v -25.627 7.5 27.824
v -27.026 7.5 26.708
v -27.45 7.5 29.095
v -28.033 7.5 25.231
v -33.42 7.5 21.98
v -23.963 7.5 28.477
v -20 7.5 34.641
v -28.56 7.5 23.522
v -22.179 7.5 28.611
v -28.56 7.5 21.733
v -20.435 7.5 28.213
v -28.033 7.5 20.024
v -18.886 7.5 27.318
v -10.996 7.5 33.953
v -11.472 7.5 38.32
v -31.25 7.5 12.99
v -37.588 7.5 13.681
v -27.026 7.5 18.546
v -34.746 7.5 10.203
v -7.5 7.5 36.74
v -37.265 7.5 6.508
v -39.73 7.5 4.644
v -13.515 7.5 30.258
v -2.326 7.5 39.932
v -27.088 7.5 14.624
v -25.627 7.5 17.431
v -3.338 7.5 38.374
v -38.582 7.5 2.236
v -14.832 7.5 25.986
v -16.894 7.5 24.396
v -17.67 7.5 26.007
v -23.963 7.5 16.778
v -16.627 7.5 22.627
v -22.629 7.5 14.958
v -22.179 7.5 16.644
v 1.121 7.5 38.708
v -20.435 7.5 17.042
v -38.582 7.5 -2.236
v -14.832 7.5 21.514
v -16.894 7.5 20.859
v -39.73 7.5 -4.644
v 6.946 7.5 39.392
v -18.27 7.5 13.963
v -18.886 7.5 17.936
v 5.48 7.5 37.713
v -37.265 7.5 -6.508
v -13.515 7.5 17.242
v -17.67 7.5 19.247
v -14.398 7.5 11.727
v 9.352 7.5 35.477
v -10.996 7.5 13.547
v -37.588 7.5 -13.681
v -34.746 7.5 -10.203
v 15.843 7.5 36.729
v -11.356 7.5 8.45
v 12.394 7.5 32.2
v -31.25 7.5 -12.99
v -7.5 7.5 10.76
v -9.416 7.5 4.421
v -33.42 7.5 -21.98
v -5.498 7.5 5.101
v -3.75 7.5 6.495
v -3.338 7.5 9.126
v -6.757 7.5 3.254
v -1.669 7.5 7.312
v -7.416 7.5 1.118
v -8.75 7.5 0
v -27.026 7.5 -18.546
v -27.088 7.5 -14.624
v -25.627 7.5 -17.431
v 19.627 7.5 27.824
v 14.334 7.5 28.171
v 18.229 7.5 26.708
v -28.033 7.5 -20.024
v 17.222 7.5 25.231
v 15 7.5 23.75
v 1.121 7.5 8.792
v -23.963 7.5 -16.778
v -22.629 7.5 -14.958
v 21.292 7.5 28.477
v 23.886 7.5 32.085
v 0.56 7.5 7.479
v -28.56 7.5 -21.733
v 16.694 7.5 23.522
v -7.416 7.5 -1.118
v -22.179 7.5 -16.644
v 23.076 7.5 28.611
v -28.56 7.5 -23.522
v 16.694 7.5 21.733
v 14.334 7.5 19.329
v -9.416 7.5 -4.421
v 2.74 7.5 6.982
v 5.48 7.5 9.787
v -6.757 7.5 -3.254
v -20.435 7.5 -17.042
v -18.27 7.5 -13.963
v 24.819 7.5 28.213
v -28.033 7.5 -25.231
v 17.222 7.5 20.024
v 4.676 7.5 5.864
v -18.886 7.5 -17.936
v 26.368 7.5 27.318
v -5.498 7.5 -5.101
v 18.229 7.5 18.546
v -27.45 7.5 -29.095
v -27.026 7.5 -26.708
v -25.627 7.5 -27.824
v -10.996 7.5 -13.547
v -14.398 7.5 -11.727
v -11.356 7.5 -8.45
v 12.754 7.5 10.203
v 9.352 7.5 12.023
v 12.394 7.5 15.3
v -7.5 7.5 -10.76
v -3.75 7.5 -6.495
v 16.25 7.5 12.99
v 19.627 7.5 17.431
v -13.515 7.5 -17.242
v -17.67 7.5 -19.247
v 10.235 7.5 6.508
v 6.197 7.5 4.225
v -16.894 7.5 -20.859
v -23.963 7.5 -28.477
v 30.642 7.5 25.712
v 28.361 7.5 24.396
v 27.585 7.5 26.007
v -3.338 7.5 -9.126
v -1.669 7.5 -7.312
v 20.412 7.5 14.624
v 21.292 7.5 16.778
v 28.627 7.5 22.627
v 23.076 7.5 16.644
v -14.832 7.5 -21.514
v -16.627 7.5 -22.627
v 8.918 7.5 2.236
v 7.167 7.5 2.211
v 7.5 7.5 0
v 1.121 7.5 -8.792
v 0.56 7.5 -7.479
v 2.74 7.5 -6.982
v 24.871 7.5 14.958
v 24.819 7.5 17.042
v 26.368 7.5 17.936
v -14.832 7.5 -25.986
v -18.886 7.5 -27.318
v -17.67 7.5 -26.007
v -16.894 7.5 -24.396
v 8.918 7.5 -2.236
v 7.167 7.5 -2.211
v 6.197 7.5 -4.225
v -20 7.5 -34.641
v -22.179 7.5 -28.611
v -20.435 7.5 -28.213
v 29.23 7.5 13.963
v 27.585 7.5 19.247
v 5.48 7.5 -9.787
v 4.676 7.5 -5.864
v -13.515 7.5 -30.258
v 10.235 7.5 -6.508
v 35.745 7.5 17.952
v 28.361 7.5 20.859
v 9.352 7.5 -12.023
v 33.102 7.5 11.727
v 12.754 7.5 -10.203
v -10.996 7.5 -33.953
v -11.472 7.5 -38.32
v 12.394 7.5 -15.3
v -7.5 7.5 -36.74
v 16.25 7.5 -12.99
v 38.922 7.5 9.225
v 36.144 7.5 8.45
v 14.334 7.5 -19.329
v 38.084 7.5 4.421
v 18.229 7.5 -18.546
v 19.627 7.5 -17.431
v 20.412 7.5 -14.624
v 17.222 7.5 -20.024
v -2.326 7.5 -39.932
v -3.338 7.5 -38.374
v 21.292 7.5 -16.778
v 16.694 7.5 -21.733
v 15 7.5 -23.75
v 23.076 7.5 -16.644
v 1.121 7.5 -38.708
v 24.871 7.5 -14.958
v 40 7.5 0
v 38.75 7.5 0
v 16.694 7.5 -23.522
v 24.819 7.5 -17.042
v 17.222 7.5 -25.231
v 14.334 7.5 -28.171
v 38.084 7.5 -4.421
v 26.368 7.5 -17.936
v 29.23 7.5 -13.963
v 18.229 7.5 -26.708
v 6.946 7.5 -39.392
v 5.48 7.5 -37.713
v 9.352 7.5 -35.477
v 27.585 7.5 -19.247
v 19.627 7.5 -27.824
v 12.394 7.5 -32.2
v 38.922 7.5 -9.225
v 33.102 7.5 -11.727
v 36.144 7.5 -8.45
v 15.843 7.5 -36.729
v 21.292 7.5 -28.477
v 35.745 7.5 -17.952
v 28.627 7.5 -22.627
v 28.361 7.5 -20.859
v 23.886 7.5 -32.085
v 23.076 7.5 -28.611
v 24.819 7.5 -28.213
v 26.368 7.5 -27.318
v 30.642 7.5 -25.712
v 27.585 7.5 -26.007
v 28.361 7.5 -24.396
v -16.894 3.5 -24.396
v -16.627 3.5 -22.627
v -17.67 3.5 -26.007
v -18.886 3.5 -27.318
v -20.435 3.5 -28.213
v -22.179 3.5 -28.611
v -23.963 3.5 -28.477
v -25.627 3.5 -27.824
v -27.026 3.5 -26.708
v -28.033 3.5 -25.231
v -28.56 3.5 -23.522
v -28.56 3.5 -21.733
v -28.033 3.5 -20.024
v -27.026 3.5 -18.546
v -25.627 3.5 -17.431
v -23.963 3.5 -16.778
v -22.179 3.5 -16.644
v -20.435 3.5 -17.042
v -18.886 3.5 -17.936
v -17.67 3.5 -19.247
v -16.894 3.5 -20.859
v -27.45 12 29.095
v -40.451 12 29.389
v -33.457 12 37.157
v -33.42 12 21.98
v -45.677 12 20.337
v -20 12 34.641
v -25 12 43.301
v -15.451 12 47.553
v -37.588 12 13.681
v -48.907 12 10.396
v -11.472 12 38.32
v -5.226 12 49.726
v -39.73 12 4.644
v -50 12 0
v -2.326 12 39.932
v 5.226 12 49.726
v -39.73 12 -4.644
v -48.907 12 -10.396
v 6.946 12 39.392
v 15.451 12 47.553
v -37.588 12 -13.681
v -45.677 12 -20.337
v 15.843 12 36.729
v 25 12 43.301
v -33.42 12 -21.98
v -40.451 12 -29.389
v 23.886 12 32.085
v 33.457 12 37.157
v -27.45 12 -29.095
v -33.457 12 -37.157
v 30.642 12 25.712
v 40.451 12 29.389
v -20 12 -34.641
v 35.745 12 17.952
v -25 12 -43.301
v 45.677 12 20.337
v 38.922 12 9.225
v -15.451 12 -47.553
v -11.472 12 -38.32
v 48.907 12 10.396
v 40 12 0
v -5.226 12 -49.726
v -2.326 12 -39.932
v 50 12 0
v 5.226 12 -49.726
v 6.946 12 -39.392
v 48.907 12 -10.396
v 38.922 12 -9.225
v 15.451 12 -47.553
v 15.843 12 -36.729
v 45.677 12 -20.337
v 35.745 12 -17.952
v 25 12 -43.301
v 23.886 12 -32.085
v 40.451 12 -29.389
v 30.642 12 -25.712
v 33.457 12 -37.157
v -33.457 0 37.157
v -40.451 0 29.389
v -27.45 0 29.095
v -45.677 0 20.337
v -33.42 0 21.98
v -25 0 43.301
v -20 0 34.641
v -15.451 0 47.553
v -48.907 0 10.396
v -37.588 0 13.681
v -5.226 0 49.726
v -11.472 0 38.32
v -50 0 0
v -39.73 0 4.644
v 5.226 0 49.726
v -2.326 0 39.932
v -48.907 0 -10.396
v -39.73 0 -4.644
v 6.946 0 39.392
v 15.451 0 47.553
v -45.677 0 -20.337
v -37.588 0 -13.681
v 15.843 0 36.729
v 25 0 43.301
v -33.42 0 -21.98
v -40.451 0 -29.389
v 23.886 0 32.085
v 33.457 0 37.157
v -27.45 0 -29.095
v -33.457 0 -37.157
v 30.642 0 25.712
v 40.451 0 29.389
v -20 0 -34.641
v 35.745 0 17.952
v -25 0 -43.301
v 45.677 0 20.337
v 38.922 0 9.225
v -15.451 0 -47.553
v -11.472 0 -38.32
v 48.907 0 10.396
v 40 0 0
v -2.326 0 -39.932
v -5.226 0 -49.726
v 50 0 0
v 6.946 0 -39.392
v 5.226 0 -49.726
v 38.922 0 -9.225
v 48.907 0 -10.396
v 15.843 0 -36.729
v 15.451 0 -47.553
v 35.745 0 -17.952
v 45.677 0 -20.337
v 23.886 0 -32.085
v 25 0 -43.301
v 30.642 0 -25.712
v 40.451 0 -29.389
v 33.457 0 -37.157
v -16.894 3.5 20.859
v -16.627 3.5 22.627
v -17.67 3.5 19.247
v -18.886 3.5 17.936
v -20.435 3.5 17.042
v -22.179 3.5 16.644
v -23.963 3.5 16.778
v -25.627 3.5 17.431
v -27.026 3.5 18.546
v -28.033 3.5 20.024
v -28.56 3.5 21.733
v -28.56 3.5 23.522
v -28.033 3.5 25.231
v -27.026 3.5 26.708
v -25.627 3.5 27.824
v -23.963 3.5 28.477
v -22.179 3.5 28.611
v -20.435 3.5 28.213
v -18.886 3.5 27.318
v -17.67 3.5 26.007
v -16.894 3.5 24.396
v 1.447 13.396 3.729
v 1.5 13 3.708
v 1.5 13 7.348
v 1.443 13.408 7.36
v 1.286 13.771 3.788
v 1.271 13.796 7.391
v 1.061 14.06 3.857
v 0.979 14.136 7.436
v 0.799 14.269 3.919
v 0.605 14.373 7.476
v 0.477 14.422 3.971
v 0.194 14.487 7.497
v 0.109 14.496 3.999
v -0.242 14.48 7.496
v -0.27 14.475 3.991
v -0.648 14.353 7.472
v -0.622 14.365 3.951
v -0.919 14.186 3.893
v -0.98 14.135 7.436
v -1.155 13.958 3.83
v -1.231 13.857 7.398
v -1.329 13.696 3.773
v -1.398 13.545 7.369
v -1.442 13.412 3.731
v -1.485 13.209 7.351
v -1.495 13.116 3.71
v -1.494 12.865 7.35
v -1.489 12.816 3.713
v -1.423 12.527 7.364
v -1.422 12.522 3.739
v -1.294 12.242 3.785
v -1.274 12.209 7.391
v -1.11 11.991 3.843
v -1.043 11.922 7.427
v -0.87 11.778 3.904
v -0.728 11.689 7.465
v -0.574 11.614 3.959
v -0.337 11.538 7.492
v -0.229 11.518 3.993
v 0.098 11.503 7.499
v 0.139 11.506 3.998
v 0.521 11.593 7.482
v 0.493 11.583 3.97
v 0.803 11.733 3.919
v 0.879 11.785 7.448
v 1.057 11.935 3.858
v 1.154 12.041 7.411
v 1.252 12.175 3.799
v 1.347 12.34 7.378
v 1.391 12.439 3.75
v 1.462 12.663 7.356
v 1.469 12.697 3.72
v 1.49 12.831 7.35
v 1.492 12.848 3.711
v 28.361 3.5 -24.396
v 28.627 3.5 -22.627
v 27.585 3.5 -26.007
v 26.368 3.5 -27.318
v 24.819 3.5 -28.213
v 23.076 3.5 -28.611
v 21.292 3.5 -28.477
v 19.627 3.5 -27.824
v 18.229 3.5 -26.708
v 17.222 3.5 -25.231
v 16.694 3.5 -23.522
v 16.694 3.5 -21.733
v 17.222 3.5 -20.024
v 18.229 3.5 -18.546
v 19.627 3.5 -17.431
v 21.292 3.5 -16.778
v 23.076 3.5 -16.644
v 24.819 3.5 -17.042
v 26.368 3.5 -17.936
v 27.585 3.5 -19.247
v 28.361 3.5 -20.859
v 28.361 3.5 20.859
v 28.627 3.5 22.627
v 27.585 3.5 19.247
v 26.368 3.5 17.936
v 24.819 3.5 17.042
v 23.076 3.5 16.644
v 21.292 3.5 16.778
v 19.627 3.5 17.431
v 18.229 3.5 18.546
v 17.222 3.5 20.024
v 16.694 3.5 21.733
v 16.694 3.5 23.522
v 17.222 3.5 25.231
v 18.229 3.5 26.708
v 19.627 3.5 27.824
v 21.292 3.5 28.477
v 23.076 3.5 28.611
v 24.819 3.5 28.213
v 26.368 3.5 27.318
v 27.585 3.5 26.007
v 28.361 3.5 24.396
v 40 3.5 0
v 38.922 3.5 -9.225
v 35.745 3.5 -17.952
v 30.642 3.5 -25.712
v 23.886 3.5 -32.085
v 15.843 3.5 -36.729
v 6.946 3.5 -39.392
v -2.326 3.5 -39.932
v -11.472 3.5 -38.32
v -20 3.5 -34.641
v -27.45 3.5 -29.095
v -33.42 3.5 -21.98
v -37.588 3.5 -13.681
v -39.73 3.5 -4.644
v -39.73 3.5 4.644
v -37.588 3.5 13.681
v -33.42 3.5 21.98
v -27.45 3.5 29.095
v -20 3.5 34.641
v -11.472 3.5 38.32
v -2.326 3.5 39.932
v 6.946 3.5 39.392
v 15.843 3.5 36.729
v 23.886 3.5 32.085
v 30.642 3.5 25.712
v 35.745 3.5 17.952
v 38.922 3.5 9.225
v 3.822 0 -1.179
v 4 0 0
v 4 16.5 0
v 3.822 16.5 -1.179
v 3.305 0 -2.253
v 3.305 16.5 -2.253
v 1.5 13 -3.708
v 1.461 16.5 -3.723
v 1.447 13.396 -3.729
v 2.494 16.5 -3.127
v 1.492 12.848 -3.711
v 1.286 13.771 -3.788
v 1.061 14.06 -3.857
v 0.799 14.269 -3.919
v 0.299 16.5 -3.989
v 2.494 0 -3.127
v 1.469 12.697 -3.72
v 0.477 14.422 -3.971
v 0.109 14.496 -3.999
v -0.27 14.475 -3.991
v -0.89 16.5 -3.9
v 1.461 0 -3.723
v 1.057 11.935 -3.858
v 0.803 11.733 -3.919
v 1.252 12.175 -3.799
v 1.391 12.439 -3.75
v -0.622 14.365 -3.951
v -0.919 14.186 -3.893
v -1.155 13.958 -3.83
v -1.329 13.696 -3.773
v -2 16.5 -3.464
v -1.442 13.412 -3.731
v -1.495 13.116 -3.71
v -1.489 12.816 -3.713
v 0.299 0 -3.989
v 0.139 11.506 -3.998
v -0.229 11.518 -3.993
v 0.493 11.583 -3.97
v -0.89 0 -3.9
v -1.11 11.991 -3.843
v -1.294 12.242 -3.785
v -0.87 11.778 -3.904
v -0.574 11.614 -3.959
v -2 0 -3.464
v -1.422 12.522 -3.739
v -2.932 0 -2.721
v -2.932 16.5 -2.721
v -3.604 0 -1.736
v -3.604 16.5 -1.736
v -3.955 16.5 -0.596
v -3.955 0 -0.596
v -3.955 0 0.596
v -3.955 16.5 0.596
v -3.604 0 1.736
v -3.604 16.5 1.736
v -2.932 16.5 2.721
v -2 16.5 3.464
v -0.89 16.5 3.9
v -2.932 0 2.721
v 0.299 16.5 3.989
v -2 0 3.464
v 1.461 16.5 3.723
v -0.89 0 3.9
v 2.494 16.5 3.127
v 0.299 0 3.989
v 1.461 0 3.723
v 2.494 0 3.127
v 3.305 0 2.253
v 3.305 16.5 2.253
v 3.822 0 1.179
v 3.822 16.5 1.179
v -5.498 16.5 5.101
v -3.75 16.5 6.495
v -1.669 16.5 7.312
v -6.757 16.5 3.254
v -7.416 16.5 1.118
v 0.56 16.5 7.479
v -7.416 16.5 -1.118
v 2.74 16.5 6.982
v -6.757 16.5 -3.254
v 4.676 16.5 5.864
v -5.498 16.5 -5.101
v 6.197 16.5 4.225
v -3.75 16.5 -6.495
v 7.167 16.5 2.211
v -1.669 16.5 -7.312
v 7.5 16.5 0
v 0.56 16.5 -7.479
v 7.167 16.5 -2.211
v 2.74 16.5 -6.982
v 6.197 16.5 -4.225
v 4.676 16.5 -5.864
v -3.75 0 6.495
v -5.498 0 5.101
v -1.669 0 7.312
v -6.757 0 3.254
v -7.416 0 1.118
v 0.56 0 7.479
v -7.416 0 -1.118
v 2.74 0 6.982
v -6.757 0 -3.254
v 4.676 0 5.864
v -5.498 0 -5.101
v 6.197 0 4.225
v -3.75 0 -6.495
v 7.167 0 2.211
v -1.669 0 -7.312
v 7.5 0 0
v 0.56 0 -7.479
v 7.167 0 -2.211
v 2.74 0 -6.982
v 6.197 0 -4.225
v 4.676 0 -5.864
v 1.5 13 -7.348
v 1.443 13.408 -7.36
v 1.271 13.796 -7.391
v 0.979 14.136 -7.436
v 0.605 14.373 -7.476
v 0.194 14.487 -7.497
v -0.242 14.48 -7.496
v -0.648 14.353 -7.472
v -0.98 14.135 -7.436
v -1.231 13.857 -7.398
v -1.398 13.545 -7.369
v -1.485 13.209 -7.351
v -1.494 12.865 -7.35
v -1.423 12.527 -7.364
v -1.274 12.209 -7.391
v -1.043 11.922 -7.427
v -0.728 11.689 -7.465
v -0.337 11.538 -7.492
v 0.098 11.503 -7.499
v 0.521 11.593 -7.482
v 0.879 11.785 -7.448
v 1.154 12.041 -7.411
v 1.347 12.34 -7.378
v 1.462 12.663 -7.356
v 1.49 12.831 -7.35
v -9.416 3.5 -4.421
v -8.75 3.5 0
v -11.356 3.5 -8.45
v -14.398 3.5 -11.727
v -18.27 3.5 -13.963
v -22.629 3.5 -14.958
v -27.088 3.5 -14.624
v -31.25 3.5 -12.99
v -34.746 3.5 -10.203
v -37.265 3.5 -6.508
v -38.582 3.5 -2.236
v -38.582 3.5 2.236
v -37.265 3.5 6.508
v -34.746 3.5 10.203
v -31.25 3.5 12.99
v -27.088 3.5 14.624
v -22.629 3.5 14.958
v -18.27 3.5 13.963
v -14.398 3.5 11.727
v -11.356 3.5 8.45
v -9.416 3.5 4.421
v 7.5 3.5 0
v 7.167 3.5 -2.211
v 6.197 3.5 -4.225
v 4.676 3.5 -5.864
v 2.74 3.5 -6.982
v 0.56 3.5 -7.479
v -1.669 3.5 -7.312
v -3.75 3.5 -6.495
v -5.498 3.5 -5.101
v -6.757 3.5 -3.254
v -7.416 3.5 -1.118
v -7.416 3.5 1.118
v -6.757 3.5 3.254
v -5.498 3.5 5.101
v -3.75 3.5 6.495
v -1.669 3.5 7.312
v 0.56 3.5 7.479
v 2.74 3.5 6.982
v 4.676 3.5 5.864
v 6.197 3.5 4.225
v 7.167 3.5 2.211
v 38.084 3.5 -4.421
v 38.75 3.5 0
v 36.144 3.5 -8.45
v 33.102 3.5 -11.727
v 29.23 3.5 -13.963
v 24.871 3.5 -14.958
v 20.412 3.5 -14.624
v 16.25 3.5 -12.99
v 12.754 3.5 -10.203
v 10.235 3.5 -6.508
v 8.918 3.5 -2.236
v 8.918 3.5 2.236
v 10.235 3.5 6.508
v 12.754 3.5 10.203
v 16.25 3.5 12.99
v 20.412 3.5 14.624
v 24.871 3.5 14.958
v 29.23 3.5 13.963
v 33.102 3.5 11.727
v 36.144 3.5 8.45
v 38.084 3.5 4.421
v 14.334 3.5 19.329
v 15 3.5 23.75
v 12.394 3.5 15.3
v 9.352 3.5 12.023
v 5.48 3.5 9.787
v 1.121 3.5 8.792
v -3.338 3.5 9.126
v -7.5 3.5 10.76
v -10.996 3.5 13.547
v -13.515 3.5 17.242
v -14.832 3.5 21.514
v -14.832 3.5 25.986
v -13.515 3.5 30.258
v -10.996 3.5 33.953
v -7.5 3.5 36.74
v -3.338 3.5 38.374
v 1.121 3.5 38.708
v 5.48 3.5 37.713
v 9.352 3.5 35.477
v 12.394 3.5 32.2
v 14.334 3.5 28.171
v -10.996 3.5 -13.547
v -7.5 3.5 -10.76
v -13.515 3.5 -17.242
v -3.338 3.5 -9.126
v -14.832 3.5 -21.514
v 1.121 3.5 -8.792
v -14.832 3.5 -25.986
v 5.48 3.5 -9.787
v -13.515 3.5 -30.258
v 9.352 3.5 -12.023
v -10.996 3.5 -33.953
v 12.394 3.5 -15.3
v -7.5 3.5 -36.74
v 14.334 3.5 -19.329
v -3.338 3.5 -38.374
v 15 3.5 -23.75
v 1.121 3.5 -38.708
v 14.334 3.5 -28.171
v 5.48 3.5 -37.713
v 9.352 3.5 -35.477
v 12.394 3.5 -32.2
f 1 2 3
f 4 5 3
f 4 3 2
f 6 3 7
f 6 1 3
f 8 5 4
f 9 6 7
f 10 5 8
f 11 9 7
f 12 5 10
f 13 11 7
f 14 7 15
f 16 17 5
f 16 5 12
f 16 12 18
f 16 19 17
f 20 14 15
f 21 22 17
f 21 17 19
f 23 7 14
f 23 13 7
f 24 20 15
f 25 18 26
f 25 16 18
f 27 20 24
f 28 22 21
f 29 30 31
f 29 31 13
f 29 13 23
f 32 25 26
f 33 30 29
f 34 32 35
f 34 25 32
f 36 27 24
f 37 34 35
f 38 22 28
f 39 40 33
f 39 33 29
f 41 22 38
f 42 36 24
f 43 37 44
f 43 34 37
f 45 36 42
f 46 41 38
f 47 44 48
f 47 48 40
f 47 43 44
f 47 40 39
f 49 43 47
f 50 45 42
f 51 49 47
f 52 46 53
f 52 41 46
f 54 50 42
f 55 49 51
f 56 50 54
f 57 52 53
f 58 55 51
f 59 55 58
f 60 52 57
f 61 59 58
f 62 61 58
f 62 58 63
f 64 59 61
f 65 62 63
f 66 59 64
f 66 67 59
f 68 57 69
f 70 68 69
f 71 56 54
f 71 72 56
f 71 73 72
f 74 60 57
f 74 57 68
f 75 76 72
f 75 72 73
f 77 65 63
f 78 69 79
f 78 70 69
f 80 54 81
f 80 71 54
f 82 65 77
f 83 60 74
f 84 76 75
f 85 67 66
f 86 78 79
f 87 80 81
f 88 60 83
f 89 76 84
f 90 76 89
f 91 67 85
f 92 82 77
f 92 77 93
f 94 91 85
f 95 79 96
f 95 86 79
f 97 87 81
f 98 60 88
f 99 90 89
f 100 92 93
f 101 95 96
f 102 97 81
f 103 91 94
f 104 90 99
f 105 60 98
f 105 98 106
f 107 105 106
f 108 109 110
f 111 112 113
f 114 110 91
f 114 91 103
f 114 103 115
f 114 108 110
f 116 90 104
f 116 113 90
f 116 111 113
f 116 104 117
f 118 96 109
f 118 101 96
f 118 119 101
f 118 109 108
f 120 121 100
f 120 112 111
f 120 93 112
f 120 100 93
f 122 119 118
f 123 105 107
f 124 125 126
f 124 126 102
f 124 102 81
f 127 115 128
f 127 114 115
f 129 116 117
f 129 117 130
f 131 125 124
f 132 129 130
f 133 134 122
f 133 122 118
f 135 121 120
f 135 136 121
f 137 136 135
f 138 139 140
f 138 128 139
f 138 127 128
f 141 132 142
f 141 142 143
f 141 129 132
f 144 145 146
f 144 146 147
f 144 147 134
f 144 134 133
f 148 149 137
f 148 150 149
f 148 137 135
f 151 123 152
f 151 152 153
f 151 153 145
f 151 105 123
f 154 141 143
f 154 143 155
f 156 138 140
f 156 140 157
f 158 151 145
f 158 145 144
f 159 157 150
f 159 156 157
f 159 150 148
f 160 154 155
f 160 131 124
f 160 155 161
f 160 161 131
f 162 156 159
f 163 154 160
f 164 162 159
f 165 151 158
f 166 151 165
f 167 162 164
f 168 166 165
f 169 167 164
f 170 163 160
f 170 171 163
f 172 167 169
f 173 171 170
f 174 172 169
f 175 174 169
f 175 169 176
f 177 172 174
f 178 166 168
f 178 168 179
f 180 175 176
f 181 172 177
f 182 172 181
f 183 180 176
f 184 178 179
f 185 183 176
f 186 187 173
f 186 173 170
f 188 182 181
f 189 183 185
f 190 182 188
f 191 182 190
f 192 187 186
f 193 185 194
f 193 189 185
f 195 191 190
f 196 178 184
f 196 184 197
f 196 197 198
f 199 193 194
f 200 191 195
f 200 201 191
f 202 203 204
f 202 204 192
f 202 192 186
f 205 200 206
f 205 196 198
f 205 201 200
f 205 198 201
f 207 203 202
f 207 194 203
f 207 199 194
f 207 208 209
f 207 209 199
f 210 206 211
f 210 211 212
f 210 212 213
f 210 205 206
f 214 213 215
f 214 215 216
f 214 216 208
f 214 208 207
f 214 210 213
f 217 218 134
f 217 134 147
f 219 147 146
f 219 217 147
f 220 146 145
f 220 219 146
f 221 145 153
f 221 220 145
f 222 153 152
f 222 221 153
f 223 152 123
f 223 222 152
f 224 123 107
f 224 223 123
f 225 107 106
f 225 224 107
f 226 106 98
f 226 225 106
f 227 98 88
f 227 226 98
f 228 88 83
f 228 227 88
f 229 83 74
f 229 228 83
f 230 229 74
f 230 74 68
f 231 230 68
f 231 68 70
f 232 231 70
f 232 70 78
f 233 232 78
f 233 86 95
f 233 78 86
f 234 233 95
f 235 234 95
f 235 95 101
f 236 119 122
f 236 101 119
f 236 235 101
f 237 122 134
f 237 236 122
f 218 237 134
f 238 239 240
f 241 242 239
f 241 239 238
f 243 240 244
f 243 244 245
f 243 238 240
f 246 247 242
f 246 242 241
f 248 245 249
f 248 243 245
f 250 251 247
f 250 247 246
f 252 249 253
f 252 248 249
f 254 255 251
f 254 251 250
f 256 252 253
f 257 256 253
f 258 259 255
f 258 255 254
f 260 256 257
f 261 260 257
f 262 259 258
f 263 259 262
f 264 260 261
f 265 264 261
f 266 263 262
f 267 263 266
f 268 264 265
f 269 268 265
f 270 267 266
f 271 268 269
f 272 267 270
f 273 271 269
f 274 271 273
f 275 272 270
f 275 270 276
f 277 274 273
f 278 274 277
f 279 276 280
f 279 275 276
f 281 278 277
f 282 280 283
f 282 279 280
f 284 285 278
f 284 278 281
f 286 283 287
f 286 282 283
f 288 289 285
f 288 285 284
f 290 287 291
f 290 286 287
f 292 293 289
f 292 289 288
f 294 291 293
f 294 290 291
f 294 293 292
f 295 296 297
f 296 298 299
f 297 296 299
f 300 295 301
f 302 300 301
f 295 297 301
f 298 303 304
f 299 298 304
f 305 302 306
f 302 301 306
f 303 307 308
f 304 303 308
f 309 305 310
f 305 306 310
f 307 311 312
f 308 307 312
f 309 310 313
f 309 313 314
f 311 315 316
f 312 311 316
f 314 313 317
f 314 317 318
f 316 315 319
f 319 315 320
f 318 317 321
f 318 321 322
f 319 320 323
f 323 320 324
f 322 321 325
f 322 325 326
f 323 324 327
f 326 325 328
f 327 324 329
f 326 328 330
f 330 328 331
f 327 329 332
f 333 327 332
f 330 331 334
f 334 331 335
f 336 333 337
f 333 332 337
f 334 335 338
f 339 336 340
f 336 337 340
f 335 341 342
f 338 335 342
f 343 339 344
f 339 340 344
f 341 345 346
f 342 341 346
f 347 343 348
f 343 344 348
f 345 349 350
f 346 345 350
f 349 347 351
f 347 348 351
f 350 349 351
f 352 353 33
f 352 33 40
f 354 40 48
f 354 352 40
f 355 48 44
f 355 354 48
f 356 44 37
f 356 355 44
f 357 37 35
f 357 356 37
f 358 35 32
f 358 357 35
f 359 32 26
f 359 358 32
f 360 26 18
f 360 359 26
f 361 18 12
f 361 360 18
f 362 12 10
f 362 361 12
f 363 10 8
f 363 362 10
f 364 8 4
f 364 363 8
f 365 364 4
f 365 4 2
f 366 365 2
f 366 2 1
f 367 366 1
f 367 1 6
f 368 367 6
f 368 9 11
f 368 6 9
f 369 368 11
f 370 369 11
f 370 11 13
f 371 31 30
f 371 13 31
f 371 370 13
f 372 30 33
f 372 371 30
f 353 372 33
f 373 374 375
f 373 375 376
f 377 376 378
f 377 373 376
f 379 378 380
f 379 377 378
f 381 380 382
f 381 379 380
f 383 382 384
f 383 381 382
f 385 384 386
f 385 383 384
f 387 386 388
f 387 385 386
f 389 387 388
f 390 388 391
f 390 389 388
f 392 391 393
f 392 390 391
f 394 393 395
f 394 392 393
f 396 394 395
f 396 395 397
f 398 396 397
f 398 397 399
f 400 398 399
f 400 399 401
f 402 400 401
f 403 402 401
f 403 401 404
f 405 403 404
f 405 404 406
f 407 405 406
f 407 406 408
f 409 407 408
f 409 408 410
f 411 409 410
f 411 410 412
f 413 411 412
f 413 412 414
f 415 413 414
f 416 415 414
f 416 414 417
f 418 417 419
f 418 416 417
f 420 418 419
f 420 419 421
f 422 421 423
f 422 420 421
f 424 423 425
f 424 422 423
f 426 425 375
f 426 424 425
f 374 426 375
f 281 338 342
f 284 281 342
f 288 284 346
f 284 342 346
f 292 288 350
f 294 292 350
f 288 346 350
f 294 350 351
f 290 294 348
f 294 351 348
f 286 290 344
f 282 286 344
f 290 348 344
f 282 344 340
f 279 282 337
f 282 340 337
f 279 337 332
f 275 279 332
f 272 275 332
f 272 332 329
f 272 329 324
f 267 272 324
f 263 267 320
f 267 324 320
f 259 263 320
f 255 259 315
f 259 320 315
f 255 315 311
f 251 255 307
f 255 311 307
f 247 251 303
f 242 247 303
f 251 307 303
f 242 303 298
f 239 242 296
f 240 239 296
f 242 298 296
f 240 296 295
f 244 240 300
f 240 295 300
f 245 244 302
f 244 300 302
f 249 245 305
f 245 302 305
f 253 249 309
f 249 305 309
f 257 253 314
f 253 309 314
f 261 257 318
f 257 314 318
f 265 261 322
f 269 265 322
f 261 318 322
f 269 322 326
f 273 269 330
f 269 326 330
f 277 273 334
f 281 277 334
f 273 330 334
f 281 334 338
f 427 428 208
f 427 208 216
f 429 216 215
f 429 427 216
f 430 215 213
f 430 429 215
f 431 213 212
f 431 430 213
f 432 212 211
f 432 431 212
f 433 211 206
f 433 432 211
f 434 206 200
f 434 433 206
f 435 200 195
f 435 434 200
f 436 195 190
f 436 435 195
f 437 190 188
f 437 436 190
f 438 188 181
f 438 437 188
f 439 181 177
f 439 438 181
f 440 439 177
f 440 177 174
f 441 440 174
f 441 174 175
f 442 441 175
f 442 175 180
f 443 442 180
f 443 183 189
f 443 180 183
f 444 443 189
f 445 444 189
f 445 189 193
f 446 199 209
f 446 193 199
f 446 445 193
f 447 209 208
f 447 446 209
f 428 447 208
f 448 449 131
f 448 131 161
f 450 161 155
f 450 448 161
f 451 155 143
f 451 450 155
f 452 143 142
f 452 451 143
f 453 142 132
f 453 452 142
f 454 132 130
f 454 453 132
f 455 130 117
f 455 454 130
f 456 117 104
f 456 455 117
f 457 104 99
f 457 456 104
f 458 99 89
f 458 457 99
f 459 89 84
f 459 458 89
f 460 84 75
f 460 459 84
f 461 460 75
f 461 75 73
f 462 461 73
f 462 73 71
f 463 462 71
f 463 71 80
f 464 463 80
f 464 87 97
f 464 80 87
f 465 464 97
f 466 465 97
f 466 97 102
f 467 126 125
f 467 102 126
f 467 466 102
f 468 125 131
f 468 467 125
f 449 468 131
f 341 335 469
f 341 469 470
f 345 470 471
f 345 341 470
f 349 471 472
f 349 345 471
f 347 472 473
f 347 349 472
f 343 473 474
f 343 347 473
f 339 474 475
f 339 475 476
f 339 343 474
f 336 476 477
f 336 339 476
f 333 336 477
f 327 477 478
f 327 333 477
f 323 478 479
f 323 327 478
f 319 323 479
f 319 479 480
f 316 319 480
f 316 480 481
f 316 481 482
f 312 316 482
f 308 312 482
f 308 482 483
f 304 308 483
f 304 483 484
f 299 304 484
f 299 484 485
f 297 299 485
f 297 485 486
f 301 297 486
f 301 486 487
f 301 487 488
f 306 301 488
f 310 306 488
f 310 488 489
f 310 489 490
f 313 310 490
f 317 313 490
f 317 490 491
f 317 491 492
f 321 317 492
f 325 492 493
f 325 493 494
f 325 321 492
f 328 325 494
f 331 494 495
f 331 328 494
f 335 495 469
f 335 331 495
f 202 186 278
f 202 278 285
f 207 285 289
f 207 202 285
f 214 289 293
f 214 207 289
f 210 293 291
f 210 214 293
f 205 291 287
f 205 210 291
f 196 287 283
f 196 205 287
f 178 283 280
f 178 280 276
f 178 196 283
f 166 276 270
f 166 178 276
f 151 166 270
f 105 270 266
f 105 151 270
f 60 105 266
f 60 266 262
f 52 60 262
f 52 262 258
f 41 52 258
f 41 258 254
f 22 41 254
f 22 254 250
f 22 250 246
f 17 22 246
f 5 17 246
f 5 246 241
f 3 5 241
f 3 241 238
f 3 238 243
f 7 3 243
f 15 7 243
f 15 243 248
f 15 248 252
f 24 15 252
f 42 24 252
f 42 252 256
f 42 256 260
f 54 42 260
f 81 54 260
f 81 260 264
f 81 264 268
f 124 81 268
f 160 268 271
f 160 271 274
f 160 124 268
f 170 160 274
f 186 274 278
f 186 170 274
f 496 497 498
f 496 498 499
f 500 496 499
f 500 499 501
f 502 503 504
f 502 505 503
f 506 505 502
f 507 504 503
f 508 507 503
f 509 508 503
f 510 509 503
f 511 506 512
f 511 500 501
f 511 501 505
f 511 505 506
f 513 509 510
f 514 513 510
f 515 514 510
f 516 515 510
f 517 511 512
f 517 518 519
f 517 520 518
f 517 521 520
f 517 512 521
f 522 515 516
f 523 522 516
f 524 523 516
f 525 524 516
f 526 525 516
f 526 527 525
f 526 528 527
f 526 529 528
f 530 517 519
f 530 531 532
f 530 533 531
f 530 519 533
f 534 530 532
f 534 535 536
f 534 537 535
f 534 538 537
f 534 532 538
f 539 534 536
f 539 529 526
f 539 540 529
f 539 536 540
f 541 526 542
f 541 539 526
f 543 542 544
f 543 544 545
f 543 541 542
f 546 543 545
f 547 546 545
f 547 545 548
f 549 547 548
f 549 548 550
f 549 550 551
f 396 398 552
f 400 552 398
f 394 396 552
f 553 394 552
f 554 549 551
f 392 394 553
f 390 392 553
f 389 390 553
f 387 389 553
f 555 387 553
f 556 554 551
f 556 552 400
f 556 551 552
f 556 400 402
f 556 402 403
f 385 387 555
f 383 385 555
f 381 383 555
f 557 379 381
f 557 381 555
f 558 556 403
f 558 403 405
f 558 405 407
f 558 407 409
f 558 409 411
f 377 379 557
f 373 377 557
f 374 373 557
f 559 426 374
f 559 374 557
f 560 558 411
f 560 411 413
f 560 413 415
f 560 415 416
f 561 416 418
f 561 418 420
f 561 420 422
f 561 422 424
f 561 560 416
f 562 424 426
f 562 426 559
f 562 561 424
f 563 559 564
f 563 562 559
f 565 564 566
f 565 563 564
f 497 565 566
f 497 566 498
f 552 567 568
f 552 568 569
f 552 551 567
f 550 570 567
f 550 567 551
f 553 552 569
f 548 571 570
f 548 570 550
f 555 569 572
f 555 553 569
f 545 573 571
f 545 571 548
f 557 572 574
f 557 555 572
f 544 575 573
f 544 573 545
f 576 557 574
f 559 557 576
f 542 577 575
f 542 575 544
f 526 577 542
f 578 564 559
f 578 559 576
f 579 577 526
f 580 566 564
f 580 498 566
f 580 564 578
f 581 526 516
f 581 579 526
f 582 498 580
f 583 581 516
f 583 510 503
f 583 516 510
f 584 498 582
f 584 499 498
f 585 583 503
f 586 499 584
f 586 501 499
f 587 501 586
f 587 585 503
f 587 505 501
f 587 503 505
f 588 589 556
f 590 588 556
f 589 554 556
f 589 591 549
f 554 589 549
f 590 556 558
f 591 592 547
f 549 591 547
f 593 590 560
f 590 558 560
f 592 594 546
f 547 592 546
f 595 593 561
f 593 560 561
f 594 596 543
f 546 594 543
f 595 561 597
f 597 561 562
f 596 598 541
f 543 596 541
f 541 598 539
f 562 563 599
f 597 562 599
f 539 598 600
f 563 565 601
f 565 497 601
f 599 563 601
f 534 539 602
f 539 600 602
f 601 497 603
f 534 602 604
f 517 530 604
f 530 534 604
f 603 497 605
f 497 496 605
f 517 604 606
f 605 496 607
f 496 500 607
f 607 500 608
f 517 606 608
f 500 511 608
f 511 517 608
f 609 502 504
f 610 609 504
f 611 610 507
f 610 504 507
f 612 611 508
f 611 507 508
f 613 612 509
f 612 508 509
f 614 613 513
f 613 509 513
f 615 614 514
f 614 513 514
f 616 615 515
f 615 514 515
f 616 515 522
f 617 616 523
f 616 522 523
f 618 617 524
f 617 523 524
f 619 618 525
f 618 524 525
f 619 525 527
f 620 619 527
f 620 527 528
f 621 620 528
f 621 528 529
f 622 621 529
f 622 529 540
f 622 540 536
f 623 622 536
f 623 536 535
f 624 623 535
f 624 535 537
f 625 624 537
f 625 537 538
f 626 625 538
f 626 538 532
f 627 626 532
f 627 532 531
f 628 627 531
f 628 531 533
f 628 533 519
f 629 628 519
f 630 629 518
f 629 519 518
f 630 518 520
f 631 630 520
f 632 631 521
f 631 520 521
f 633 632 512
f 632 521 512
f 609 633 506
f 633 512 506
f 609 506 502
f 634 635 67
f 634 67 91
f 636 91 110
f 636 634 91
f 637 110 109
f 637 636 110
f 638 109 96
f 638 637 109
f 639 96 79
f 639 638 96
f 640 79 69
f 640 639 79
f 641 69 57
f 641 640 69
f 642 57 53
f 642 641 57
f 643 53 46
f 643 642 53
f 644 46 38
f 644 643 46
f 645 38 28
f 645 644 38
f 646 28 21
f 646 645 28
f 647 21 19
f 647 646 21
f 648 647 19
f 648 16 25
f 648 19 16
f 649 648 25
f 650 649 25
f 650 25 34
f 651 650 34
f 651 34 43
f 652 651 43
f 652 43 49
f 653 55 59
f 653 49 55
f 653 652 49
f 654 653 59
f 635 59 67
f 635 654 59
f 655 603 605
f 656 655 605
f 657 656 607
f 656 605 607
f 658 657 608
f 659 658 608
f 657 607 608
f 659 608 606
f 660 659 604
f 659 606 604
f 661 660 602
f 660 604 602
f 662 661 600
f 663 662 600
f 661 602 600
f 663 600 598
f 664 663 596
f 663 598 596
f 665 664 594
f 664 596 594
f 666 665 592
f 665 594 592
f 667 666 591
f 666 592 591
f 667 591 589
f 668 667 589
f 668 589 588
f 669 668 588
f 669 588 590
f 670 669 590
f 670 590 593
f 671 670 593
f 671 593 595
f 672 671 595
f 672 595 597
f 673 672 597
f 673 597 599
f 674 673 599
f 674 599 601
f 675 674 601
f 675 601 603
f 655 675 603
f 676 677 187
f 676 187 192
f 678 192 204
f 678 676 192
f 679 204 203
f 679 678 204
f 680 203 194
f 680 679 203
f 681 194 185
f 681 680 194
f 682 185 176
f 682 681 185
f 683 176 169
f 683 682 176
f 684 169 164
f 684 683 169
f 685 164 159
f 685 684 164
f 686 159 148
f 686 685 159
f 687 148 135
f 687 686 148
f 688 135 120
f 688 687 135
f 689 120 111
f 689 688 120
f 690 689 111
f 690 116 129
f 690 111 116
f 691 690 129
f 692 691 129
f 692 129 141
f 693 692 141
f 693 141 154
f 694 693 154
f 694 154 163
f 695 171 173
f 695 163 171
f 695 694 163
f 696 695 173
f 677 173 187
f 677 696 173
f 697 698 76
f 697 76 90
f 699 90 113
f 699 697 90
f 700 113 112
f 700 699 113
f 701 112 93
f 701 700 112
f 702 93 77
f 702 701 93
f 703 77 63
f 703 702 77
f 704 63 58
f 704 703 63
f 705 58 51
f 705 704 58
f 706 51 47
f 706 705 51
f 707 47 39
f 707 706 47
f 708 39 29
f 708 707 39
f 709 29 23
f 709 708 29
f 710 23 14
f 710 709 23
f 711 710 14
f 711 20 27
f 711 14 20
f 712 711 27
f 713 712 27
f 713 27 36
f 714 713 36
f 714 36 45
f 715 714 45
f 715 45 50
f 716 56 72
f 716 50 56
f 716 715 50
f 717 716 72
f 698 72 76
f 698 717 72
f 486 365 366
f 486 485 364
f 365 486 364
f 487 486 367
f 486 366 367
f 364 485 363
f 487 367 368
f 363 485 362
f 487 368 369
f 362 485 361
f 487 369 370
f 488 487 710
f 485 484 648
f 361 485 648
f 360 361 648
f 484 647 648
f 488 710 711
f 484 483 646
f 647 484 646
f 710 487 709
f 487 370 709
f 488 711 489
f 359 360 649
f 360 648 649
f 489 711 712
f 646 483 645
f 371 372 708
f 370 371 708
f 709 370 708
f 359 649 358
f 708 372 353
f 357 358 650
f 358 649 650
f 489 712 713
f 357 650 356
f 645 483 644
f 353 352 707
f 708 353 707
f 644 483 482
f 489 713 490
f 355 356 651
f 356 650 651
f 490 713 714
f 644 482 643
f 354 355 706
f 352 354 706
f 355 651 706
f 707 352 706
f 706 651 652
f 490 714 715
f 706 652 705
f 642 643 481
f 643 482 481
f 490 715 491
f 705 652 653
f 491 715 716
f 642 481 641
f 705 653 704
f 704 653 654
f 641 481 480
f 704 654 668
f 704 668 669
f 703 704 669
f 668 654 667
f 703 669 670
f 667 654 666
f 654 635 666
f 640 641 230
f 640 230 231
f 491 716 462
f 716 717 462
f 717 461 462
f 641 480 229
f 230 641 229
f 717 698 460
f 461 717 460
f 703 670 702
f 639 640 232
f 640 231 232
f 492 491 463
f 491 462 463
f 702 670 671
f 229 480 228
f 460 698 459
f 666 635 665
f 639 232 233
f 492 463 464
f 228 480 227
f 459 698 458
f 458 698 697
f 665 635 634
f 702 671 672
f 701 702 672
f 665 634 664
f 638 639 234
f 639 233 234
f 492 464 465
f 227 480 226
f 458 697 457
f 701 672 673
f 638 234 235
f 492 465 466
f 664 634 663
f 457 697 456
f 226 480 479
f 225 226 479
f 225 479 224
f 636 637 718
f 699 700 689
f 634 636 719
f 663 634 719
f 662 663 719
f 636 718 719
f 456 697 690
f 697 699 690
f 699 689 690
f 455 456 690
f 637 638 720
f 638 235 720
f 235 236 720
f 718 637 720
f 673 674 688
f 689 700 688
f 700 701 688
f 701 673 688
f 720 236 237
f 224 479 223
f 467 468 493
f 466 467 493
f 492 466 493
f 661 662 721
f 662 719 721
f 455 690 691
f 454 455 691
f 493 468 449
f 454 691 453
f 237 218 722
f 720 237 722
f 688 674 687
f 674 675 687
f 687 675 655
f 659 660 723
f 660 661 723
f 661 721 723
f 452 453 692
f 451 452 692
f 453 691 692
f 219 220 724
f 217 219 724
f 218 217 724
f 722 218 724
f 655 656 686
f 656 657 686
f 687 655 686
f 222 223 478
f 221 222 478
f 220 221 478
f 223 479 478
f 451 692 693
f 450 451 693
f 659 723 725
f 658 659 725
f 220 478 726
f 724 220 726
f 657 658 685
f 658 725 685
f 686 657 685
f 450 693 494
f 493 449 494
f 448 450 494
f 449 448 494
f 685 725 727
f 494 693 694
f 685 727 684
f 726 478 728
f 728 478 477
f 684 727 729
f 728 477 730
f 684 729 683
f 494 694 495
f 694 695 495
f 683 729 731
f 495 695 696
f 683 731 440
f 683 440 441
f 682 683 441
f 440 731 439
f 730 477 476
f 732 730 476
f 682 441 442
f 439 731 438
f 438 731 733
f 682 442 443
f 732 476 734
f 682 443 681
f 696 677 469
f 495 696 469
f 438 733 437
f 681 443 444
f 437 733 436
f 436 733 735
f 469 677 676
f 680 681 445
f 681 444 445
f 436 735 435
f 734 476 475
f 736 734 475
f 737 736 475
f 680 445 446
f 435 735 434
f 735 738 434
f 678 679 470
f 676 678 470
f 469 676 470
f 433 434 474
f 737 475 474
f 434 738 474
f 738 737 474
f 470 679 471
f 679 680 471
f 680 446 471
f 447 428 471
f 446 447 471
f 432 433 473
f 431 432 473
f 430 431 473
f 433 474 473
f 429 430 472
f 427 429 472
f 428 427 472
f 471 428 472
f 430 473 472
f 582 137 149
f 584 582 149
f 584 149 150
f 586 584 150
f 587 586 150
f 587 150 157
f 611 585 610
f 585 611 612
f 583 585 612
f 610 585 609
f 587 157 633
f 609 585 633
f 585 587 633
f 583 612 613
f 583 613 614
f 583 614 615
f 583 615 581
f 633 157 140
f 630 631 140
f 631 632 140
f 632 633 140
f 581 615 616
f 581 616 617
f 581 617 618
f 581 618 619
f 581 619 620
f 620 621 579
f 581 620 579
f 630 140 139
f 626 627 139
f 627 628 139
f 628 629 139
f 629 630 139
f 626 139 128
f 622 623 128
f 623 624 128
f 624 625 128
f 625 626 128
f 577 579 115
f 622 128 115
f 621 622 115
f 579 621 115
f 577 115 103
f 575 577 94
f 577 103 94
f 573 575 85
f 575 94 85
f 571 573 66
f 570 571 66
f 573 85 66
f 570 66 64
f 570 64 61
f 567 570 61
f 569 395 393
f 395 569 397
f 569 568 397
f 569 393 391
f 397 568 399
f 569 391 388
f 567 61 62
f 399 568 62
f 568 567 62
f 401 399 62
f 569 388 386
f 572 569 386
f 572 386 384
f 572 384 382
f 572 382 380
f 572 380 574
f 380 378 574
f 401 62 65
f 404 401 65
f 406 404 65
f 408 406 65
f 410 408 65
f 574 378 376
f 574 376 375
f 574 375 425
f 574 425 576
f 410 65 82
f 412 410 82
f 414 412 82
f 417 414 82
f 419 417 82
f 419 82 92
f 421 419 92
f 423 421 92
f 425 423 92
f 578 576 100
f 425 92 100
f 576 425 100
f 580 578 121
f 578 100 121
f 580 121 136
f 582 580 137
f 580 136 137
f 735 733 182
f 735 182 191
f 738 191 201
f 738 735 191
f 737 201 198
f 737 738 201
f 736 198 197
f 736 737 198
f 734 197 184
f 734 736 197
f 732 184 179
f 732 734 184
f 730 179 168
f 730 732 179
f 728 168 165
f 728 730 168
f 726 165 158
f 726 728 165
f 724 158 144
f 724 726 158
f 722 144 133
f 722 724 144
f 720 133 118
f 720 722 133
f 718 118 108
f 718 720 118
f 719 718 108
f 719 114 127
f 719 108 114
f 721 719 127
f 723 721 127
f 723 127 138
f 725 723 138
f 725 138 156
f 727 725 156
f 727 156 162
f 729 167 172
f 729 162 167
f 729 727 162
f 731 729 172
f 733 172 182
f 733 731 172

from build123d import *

# Parameters (mm, degrees)
SKETCH1_R               = 50
SKETCH1_R_2             = 40
BOSS_EXTRUDE1_DEPTH     = 12
SKETCH1_4_R             = 7.5
SKETCH1_4_R_2           = 4
BOSS_EXTRUDE2_DEPTH     = 16.5
BOSS_EXTRUDE3_START     = 3.5
SKETCH1_5_R             = 40
SKETCH1_5_R_2           = 7.5
BOSS_EXTRUDE3_DEPTH     = 4
SKETCH2_R               = 15
SKETCH2_R_2             = 6
CUT_EXTRUDE3_DEPTH      = 17.5
CUT_EXTRUDE3_DEPTH_BACK = 1
SKETCH3_R               = 1.5
CUT_EXTRUDE4_DEPTH      = 10
CUT_EXTRUDE4_DEPTH_BACK = 10


with BuildPart() as part:
    # Sketch1 → Boss-Extrude1 (new body)
    with BuildSketch(Plane(origin=(0, 0, 0), x_dir=(1, 0, 0), z_dir=(0, 1, 0))):
        Circle(SKETCH1_R)
        Circle(SKETCH1_R_2, mode=Mode.SUBTRACT)
    extrude(amount=BOSS_EXTRUDE1_DEPTH)



with BuildPart() as body_2:
    # Sketch1<4> → Boss-Extrude2 (new body)
    with BuildSketch(Plane(origin=(0, 0, 0), x_dir=(1, 0, 0), z_dir=(0, 1, 0))):
        Circle(SKETCH1_4_R)
        Circle(SKETCH1_4_R_2, mode=Mode.SUBTRACT)
    extrude(amount=BOSS_EXTRUDE2_DEPTH)


with BuildPart() as part_1:
    add(part.part)

    add(body_2.part)  # Boss-Extrude3 merges body 2
    # Sketch1<5> → Boss-Extrude3 (add)
    with BuildSketch(Plane(origin=(0, 0, 0), x_dir=(1, 0, 0), z_dir=(0, 1, 0)).offset(BOSS_EXTRUDE3_START)):
        Circle(SKETCH1_5_R)
        Circle(SKETCH1_5_R_2, mode=Mode.SUBTRACT)
    extrude(amount=BOSS_EXTRUDE3_DEPTH)

    # Sketch2 → Cut-Extrude3 (cut, two sides)
    with BuildSketch(Plane(origin=(0, 0, 0), x_dir=(1, 0, 0), z_dir=(0, 1, 0))) as cut_extrude3_sk:
        with Locations((-23.75, 0)):
            Circle(SKETCH2_R)
        with Locations((0, -23.75)):
            Circle(SKETCH2_R)
        with Locations((-22.627416998, -22.627416998)):
            Circle(SKETCH2_R_2)
        with Locations((-22.627416998, 22.627416998)):
            Circle(SKETCH2_R_2)
        with Locations((0, 23.75)):
            Circle(SKETCH2_R)
        with Locations((23.75, 0)):
            Circle(SKETCH2_R)
        with Locations((22.627416998, -22.627416998)):
            Circle(SKETCH2_R_2)
        with Locations((22.627416998, 22.627416998)):
            Circle(SKETCH2_R_2)
    extrude(amount=CUT_EXTRUDE3_DEPTH, mode=Mode.SUBTRACT)
    extrude(cut_extrude3_sk.sketch, amount=-CUT_EXTRUDE3_DEPTH_BACK, mode=Mode.SUBTRACT)

    # Sketch3 → Cut-Extrude4 (cut, two sides)
    with BuildSketch(Plane.XY) as cut_extrude4_sk:
        with Locations((0, 13)):
            Circle(SKETCH3_R)
    extrude(amount=CUT_EXTRUDE4_DEPTH, mode=Mode.SUBTRACT)
    extrude(cut_extrude4_sk.sketch, amount=-CUT_EXTRUDE4_DEPTH_BACK, mode=Mode.SUBTRACT)


solid = part_1.part
